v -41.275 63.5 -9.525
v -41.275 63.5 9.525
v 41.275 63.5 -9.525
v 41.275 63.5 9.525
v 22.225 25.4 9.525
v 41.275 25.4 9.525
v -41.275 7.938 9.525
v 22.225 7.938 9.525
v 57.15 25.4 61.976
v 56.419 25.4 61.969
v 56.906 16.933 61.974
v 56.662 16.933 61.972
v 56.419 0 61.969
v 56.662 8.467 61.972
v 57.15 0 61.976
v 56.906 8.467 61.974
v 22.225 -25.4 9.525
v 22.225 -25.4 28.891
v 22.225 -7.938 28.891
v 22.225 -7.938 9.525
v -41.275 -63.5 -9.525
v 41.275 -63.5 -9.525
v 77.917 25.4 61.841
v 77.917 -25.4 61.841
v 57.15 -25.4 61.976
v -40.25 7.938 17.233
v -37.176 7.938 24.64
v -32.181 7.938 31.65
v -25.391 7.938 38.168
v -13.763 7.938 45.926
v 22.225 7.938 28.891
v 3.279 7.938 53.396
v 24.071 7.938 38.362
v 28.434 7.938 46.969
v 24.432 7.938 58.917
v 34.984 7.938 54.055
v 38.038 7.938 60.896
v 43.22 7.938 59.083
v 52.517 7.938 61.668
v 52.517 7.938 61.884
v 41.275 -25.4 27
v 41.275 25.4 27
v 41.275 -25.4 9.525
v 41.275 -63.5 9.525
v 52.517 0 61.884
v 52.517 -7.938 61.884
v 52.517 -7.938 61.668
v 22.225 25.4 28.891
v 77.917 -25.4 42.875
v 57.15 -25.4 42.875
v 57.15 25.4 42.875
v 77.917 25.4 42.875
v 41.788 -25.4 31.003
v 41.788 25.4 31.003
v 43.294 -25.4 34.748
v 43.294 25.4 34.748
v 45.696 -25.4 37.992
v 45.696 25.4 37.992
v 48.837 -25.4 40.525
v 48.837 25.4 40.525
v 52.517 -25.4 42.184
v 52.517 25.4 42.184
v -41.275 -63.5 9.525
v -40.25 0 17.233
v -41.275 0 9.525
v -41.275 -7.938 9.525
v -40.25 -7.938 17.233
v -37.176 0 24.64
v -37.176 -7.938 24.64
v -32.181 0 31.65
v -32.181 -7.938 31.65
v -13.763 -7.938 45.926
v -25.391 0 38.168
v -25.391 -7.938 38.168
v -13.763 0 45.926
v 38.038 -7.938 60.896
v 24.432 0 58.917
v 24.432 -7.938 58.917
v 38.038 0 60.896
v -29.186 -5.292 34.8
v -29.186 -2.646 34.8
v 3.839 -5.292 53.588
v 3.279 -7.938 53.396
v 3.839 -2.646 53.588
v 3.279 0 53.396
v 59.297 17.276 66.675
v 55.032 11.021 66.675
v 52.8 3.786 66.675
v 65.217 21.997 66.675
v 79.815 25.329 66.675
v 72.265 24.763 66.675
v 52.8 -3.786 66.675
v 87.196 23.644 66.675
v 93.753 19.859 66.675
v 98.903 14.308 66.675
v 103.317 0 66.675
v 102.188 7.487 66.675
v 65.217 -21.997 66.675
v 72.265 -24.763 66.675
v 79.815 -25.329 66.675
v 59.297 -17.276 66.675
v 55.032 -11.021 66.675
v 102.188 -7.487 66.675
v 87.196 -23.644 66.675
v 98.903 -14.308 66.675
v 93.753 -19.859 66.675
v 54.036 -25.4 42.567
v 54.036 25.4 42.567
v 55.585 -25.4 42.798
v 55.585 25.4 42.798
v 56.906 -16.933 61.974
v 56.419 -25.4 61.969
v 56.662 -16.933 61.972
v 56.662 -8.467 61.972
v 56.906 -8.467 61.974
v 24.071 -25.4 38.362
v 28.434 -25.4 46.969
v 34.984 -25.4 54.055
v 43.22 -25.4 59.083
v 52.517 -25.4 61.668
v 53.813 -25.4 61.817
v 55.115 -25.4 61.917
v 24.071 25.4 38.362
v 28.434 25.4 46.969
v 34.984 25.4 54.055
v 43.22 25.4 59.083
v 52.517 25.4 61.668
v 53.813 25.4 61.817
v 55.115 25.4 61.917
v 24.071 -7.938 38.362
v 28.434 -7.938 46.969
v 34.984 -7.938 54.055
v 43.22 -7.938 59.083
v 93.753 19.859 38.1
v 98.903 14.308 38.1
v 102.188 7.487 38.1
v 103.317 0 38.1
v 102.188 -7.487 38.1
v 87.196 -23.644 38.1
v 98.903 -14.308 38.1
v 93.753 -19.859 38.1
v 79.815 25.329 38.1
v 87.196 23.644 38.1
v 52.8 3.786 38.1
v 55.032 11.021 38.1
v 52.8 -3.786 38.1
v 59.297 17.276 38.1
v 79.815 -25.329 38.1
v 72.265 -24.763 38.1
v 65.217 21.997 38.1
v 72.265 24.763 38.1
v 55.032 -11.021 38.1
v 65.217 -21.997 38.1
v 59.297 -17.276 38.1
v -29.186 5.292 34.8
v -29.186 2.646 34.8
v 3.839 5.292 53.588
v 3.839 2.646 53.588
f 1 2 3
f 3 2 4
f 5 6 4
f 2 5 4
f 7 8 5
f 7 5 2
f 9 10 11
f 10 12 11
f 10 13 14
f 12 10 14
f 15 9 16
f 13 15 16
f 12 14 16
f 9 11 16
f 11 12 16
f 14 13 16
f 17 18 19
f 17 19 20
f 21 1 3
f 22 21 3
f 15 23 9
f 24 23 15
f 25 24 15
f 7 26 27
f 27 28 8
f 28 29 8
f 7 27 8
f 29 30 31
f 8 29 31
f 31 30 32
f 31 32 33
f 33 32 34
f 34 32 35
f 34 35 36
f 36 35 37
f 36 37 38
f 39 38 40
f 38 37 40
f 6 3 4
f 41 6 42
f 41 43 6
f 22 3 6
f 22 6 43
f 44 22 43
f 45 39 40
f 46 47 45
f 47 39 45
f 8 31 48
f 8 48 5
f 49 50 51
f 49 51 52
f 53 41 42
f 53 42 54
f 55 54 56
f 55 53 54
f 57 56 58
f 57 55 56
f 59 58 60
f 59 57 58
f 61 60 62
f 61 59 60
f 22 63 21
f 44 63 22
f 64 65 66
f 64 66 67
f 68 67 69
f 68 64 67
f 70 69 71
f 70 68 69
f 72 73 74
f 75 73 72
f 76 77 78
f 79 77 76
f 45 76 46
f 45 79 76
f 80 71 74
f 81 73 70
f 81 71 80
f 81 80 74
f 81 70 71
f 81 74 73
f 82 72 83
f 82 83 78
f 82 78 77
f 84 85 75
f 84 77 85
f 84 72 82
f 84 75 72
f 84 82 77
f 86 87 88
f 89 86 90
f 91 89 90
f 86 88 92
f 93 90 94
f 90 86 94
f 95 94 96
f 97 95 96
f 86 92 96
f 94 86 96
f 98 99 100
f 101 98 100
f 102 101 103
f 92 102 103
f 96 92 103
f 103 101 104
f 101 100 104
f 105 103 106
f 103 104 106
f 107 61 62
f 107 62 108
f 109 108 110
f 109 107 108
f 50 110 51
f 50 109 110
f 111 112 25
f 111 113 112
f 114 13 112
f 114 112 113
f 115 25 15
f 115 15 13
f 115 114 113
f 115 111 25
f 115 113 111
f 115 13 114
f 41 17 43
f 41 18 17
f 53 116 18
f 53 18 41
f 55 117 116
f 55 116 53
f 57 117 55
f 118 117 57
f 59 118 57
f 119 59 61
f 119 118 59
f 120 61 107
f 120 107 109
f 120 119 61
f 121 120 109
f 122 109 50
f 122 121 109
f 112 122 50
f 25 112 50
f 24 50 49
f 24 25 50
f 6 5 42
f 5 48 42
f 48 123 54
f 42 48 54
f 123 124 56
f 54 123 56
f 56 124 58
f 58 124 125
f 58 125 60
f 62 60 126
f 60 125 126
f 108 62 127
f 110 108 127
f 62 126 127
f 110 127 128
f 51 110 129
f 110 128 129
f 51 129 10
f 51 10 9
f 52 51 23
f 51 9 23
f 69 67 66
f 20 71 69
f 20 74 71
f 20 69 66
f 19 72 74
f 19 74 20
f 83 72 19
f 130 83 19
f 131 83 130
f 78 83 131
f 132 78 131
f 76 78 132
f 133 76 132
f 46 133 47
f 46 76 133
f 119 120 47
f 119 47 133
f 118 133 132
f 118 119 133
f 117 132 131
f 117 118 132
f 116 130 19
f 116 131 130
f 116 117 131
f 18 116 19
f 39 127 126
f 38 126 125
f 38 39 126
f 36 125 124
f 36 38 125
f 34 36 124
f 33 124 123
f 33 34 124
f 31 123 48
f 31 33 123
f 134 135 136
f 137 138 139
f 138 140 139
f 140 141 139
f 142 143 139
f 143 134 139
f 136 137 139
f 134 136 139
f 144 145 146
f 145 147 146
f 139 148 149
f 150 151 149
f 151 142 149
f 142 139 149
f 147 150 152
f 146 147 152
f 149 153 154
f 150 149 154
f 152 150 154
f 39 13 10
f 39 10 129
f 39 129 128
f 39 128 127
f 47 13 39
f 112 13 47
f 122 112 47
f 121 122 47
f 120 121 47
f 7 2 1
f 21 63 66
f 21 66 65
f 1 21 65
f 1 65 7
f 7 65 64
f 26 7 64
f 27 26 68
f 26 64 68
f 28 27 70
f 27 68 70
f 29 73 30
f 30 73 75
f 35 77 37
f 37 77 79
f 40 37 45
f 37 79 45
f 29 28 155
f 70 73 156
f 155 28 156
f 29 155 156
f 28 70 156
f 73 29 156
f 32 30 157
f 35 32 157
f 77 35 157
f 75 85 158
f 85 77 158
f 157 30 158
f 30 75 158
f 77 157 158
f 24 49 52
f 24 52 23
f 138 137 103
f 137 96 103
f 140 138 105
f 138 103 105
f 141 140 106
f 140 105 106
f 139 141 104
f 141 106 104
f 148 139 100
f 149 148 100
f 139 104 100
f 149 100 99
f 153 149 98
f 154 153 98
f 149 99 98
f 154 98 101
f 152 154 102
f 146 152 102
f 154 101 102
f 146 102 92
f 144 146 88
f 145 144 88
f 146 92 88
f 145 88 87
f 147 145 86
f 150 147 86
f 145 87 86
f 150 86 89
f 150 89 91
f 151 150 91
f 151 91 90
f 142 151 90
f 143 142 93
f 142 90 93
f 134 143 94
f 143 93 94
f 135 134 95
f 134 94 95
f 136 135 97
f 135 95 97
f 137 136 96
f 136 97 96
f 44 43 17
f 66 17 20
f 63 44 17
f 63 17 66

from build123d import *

# Parameters (mm, degrees)
F1_DEPTH = 63.5
F2_DEPTH = 7.9375
F3_DEPTH = 25.4


with BuildPart() as f1:
    # F0 (on Front) → F1 (new body, symmetric)
    with BuildSketch(Plane.XZ):
        Polygon((41.275, -9.525), (41.275, 9.525), (22.225, 9.525), (-41.275, 9.525), (-41.275, -9.525), align=None)
    extrude(amount=F1_DEPTH, both=True)

    # F0 (on Front) → F2 (join, symmetric)
    with BuildSketch(Plane.XZ):
        with BuildLine():
            Line((-41.275, 9.525), (22.225, 9.525))
            Line((22.225, 9.525), (22.225, 28.890748))
            ThreePointArc((22.225, 28.890748), (31.463341, 50.738889), (52.516632, 61.668077))
            Line((52.516632, 61.668077), (52.516632, 61.88385))
            add(Edge.make_bspline(
                [(-41.275, 9.525), (-41.415625, 36.708206), (-2.225033, 60.169172), (52.516632, 61.88385)],
                knots=[0, 0, 0, 0, 108.491455, 108.491455, 108.491455, 108.491455], degree=3))
        make_face()
    extrude(amount=F2_DEPTH, both=True)

    # F0 (on Front) → F3 (join, symmetric)
    with BuildSketch(Plane.XZ):
        with BuildLine():
            Line((22.225, 9.525), (41.275, 9.525))
            Line((41.275, 9.525), (41.275, 27.0002))
            ThreePointArc((41.275, 27.0002), (44.391271, 36.446387), (52.516632, 42.183991))
            Line((52.516632, 42.183991), (52.516632, 61.668077))
            ThreePointArc((52.516632, 61.668077), (31.463341, 50.738889), (22.225, 28.890748))
            Line((22.225, 28.890748), (22.225, 9.525))
        make_face()
        with BuildLine():
            Line((52.516632, 61.668077), (52.516632, 42.183991))
            ThreePointArc((52.516632, 42.183991), (54.807679, 42.701447), (57.15, 42.8752))
            Line((57.15, 42.8752), (77.916632, 42.8752))
            Line((77.916632, 42.8752), (77.916632, 61.84097))
            Line((77.916632, 61.84097), (57.15, 61.976332))
            add(Edge.make_bspline(
                [(56.418681, 61.968685), (56.662166, 61.971662), (56.90594, 61.974211), (57.15, 61.976332)],
                knots=[111.052289, 111.052289, 111.052289, 111.052289, 111.528574, 111.528574, 111.528574, 111.528574], degree=3))
            ThreePointArc((56.418681, 61.968685), (54.463449, 61.873001), (52.516632, 61.668077))
        make_face()
    extrude(amount=F3_DEPTH, both=True)


with BuildPart() as f4:
    # F0 (on Front) → F4 (revolve)
    with BuildSketch(Plane.XZ):
        Polygon((77.916632, 61.84097), (77.916632, 42.8752), (77.916632, 38.1), (103.316632, 38.1), (103.316632, 66.675), (77.916632, 66.675), align=None)
    revolve(axis=Axis((77.916632, 0, 52.3875), (0, 0, -1)))


solid = Compound([f1.part, f4.part])
